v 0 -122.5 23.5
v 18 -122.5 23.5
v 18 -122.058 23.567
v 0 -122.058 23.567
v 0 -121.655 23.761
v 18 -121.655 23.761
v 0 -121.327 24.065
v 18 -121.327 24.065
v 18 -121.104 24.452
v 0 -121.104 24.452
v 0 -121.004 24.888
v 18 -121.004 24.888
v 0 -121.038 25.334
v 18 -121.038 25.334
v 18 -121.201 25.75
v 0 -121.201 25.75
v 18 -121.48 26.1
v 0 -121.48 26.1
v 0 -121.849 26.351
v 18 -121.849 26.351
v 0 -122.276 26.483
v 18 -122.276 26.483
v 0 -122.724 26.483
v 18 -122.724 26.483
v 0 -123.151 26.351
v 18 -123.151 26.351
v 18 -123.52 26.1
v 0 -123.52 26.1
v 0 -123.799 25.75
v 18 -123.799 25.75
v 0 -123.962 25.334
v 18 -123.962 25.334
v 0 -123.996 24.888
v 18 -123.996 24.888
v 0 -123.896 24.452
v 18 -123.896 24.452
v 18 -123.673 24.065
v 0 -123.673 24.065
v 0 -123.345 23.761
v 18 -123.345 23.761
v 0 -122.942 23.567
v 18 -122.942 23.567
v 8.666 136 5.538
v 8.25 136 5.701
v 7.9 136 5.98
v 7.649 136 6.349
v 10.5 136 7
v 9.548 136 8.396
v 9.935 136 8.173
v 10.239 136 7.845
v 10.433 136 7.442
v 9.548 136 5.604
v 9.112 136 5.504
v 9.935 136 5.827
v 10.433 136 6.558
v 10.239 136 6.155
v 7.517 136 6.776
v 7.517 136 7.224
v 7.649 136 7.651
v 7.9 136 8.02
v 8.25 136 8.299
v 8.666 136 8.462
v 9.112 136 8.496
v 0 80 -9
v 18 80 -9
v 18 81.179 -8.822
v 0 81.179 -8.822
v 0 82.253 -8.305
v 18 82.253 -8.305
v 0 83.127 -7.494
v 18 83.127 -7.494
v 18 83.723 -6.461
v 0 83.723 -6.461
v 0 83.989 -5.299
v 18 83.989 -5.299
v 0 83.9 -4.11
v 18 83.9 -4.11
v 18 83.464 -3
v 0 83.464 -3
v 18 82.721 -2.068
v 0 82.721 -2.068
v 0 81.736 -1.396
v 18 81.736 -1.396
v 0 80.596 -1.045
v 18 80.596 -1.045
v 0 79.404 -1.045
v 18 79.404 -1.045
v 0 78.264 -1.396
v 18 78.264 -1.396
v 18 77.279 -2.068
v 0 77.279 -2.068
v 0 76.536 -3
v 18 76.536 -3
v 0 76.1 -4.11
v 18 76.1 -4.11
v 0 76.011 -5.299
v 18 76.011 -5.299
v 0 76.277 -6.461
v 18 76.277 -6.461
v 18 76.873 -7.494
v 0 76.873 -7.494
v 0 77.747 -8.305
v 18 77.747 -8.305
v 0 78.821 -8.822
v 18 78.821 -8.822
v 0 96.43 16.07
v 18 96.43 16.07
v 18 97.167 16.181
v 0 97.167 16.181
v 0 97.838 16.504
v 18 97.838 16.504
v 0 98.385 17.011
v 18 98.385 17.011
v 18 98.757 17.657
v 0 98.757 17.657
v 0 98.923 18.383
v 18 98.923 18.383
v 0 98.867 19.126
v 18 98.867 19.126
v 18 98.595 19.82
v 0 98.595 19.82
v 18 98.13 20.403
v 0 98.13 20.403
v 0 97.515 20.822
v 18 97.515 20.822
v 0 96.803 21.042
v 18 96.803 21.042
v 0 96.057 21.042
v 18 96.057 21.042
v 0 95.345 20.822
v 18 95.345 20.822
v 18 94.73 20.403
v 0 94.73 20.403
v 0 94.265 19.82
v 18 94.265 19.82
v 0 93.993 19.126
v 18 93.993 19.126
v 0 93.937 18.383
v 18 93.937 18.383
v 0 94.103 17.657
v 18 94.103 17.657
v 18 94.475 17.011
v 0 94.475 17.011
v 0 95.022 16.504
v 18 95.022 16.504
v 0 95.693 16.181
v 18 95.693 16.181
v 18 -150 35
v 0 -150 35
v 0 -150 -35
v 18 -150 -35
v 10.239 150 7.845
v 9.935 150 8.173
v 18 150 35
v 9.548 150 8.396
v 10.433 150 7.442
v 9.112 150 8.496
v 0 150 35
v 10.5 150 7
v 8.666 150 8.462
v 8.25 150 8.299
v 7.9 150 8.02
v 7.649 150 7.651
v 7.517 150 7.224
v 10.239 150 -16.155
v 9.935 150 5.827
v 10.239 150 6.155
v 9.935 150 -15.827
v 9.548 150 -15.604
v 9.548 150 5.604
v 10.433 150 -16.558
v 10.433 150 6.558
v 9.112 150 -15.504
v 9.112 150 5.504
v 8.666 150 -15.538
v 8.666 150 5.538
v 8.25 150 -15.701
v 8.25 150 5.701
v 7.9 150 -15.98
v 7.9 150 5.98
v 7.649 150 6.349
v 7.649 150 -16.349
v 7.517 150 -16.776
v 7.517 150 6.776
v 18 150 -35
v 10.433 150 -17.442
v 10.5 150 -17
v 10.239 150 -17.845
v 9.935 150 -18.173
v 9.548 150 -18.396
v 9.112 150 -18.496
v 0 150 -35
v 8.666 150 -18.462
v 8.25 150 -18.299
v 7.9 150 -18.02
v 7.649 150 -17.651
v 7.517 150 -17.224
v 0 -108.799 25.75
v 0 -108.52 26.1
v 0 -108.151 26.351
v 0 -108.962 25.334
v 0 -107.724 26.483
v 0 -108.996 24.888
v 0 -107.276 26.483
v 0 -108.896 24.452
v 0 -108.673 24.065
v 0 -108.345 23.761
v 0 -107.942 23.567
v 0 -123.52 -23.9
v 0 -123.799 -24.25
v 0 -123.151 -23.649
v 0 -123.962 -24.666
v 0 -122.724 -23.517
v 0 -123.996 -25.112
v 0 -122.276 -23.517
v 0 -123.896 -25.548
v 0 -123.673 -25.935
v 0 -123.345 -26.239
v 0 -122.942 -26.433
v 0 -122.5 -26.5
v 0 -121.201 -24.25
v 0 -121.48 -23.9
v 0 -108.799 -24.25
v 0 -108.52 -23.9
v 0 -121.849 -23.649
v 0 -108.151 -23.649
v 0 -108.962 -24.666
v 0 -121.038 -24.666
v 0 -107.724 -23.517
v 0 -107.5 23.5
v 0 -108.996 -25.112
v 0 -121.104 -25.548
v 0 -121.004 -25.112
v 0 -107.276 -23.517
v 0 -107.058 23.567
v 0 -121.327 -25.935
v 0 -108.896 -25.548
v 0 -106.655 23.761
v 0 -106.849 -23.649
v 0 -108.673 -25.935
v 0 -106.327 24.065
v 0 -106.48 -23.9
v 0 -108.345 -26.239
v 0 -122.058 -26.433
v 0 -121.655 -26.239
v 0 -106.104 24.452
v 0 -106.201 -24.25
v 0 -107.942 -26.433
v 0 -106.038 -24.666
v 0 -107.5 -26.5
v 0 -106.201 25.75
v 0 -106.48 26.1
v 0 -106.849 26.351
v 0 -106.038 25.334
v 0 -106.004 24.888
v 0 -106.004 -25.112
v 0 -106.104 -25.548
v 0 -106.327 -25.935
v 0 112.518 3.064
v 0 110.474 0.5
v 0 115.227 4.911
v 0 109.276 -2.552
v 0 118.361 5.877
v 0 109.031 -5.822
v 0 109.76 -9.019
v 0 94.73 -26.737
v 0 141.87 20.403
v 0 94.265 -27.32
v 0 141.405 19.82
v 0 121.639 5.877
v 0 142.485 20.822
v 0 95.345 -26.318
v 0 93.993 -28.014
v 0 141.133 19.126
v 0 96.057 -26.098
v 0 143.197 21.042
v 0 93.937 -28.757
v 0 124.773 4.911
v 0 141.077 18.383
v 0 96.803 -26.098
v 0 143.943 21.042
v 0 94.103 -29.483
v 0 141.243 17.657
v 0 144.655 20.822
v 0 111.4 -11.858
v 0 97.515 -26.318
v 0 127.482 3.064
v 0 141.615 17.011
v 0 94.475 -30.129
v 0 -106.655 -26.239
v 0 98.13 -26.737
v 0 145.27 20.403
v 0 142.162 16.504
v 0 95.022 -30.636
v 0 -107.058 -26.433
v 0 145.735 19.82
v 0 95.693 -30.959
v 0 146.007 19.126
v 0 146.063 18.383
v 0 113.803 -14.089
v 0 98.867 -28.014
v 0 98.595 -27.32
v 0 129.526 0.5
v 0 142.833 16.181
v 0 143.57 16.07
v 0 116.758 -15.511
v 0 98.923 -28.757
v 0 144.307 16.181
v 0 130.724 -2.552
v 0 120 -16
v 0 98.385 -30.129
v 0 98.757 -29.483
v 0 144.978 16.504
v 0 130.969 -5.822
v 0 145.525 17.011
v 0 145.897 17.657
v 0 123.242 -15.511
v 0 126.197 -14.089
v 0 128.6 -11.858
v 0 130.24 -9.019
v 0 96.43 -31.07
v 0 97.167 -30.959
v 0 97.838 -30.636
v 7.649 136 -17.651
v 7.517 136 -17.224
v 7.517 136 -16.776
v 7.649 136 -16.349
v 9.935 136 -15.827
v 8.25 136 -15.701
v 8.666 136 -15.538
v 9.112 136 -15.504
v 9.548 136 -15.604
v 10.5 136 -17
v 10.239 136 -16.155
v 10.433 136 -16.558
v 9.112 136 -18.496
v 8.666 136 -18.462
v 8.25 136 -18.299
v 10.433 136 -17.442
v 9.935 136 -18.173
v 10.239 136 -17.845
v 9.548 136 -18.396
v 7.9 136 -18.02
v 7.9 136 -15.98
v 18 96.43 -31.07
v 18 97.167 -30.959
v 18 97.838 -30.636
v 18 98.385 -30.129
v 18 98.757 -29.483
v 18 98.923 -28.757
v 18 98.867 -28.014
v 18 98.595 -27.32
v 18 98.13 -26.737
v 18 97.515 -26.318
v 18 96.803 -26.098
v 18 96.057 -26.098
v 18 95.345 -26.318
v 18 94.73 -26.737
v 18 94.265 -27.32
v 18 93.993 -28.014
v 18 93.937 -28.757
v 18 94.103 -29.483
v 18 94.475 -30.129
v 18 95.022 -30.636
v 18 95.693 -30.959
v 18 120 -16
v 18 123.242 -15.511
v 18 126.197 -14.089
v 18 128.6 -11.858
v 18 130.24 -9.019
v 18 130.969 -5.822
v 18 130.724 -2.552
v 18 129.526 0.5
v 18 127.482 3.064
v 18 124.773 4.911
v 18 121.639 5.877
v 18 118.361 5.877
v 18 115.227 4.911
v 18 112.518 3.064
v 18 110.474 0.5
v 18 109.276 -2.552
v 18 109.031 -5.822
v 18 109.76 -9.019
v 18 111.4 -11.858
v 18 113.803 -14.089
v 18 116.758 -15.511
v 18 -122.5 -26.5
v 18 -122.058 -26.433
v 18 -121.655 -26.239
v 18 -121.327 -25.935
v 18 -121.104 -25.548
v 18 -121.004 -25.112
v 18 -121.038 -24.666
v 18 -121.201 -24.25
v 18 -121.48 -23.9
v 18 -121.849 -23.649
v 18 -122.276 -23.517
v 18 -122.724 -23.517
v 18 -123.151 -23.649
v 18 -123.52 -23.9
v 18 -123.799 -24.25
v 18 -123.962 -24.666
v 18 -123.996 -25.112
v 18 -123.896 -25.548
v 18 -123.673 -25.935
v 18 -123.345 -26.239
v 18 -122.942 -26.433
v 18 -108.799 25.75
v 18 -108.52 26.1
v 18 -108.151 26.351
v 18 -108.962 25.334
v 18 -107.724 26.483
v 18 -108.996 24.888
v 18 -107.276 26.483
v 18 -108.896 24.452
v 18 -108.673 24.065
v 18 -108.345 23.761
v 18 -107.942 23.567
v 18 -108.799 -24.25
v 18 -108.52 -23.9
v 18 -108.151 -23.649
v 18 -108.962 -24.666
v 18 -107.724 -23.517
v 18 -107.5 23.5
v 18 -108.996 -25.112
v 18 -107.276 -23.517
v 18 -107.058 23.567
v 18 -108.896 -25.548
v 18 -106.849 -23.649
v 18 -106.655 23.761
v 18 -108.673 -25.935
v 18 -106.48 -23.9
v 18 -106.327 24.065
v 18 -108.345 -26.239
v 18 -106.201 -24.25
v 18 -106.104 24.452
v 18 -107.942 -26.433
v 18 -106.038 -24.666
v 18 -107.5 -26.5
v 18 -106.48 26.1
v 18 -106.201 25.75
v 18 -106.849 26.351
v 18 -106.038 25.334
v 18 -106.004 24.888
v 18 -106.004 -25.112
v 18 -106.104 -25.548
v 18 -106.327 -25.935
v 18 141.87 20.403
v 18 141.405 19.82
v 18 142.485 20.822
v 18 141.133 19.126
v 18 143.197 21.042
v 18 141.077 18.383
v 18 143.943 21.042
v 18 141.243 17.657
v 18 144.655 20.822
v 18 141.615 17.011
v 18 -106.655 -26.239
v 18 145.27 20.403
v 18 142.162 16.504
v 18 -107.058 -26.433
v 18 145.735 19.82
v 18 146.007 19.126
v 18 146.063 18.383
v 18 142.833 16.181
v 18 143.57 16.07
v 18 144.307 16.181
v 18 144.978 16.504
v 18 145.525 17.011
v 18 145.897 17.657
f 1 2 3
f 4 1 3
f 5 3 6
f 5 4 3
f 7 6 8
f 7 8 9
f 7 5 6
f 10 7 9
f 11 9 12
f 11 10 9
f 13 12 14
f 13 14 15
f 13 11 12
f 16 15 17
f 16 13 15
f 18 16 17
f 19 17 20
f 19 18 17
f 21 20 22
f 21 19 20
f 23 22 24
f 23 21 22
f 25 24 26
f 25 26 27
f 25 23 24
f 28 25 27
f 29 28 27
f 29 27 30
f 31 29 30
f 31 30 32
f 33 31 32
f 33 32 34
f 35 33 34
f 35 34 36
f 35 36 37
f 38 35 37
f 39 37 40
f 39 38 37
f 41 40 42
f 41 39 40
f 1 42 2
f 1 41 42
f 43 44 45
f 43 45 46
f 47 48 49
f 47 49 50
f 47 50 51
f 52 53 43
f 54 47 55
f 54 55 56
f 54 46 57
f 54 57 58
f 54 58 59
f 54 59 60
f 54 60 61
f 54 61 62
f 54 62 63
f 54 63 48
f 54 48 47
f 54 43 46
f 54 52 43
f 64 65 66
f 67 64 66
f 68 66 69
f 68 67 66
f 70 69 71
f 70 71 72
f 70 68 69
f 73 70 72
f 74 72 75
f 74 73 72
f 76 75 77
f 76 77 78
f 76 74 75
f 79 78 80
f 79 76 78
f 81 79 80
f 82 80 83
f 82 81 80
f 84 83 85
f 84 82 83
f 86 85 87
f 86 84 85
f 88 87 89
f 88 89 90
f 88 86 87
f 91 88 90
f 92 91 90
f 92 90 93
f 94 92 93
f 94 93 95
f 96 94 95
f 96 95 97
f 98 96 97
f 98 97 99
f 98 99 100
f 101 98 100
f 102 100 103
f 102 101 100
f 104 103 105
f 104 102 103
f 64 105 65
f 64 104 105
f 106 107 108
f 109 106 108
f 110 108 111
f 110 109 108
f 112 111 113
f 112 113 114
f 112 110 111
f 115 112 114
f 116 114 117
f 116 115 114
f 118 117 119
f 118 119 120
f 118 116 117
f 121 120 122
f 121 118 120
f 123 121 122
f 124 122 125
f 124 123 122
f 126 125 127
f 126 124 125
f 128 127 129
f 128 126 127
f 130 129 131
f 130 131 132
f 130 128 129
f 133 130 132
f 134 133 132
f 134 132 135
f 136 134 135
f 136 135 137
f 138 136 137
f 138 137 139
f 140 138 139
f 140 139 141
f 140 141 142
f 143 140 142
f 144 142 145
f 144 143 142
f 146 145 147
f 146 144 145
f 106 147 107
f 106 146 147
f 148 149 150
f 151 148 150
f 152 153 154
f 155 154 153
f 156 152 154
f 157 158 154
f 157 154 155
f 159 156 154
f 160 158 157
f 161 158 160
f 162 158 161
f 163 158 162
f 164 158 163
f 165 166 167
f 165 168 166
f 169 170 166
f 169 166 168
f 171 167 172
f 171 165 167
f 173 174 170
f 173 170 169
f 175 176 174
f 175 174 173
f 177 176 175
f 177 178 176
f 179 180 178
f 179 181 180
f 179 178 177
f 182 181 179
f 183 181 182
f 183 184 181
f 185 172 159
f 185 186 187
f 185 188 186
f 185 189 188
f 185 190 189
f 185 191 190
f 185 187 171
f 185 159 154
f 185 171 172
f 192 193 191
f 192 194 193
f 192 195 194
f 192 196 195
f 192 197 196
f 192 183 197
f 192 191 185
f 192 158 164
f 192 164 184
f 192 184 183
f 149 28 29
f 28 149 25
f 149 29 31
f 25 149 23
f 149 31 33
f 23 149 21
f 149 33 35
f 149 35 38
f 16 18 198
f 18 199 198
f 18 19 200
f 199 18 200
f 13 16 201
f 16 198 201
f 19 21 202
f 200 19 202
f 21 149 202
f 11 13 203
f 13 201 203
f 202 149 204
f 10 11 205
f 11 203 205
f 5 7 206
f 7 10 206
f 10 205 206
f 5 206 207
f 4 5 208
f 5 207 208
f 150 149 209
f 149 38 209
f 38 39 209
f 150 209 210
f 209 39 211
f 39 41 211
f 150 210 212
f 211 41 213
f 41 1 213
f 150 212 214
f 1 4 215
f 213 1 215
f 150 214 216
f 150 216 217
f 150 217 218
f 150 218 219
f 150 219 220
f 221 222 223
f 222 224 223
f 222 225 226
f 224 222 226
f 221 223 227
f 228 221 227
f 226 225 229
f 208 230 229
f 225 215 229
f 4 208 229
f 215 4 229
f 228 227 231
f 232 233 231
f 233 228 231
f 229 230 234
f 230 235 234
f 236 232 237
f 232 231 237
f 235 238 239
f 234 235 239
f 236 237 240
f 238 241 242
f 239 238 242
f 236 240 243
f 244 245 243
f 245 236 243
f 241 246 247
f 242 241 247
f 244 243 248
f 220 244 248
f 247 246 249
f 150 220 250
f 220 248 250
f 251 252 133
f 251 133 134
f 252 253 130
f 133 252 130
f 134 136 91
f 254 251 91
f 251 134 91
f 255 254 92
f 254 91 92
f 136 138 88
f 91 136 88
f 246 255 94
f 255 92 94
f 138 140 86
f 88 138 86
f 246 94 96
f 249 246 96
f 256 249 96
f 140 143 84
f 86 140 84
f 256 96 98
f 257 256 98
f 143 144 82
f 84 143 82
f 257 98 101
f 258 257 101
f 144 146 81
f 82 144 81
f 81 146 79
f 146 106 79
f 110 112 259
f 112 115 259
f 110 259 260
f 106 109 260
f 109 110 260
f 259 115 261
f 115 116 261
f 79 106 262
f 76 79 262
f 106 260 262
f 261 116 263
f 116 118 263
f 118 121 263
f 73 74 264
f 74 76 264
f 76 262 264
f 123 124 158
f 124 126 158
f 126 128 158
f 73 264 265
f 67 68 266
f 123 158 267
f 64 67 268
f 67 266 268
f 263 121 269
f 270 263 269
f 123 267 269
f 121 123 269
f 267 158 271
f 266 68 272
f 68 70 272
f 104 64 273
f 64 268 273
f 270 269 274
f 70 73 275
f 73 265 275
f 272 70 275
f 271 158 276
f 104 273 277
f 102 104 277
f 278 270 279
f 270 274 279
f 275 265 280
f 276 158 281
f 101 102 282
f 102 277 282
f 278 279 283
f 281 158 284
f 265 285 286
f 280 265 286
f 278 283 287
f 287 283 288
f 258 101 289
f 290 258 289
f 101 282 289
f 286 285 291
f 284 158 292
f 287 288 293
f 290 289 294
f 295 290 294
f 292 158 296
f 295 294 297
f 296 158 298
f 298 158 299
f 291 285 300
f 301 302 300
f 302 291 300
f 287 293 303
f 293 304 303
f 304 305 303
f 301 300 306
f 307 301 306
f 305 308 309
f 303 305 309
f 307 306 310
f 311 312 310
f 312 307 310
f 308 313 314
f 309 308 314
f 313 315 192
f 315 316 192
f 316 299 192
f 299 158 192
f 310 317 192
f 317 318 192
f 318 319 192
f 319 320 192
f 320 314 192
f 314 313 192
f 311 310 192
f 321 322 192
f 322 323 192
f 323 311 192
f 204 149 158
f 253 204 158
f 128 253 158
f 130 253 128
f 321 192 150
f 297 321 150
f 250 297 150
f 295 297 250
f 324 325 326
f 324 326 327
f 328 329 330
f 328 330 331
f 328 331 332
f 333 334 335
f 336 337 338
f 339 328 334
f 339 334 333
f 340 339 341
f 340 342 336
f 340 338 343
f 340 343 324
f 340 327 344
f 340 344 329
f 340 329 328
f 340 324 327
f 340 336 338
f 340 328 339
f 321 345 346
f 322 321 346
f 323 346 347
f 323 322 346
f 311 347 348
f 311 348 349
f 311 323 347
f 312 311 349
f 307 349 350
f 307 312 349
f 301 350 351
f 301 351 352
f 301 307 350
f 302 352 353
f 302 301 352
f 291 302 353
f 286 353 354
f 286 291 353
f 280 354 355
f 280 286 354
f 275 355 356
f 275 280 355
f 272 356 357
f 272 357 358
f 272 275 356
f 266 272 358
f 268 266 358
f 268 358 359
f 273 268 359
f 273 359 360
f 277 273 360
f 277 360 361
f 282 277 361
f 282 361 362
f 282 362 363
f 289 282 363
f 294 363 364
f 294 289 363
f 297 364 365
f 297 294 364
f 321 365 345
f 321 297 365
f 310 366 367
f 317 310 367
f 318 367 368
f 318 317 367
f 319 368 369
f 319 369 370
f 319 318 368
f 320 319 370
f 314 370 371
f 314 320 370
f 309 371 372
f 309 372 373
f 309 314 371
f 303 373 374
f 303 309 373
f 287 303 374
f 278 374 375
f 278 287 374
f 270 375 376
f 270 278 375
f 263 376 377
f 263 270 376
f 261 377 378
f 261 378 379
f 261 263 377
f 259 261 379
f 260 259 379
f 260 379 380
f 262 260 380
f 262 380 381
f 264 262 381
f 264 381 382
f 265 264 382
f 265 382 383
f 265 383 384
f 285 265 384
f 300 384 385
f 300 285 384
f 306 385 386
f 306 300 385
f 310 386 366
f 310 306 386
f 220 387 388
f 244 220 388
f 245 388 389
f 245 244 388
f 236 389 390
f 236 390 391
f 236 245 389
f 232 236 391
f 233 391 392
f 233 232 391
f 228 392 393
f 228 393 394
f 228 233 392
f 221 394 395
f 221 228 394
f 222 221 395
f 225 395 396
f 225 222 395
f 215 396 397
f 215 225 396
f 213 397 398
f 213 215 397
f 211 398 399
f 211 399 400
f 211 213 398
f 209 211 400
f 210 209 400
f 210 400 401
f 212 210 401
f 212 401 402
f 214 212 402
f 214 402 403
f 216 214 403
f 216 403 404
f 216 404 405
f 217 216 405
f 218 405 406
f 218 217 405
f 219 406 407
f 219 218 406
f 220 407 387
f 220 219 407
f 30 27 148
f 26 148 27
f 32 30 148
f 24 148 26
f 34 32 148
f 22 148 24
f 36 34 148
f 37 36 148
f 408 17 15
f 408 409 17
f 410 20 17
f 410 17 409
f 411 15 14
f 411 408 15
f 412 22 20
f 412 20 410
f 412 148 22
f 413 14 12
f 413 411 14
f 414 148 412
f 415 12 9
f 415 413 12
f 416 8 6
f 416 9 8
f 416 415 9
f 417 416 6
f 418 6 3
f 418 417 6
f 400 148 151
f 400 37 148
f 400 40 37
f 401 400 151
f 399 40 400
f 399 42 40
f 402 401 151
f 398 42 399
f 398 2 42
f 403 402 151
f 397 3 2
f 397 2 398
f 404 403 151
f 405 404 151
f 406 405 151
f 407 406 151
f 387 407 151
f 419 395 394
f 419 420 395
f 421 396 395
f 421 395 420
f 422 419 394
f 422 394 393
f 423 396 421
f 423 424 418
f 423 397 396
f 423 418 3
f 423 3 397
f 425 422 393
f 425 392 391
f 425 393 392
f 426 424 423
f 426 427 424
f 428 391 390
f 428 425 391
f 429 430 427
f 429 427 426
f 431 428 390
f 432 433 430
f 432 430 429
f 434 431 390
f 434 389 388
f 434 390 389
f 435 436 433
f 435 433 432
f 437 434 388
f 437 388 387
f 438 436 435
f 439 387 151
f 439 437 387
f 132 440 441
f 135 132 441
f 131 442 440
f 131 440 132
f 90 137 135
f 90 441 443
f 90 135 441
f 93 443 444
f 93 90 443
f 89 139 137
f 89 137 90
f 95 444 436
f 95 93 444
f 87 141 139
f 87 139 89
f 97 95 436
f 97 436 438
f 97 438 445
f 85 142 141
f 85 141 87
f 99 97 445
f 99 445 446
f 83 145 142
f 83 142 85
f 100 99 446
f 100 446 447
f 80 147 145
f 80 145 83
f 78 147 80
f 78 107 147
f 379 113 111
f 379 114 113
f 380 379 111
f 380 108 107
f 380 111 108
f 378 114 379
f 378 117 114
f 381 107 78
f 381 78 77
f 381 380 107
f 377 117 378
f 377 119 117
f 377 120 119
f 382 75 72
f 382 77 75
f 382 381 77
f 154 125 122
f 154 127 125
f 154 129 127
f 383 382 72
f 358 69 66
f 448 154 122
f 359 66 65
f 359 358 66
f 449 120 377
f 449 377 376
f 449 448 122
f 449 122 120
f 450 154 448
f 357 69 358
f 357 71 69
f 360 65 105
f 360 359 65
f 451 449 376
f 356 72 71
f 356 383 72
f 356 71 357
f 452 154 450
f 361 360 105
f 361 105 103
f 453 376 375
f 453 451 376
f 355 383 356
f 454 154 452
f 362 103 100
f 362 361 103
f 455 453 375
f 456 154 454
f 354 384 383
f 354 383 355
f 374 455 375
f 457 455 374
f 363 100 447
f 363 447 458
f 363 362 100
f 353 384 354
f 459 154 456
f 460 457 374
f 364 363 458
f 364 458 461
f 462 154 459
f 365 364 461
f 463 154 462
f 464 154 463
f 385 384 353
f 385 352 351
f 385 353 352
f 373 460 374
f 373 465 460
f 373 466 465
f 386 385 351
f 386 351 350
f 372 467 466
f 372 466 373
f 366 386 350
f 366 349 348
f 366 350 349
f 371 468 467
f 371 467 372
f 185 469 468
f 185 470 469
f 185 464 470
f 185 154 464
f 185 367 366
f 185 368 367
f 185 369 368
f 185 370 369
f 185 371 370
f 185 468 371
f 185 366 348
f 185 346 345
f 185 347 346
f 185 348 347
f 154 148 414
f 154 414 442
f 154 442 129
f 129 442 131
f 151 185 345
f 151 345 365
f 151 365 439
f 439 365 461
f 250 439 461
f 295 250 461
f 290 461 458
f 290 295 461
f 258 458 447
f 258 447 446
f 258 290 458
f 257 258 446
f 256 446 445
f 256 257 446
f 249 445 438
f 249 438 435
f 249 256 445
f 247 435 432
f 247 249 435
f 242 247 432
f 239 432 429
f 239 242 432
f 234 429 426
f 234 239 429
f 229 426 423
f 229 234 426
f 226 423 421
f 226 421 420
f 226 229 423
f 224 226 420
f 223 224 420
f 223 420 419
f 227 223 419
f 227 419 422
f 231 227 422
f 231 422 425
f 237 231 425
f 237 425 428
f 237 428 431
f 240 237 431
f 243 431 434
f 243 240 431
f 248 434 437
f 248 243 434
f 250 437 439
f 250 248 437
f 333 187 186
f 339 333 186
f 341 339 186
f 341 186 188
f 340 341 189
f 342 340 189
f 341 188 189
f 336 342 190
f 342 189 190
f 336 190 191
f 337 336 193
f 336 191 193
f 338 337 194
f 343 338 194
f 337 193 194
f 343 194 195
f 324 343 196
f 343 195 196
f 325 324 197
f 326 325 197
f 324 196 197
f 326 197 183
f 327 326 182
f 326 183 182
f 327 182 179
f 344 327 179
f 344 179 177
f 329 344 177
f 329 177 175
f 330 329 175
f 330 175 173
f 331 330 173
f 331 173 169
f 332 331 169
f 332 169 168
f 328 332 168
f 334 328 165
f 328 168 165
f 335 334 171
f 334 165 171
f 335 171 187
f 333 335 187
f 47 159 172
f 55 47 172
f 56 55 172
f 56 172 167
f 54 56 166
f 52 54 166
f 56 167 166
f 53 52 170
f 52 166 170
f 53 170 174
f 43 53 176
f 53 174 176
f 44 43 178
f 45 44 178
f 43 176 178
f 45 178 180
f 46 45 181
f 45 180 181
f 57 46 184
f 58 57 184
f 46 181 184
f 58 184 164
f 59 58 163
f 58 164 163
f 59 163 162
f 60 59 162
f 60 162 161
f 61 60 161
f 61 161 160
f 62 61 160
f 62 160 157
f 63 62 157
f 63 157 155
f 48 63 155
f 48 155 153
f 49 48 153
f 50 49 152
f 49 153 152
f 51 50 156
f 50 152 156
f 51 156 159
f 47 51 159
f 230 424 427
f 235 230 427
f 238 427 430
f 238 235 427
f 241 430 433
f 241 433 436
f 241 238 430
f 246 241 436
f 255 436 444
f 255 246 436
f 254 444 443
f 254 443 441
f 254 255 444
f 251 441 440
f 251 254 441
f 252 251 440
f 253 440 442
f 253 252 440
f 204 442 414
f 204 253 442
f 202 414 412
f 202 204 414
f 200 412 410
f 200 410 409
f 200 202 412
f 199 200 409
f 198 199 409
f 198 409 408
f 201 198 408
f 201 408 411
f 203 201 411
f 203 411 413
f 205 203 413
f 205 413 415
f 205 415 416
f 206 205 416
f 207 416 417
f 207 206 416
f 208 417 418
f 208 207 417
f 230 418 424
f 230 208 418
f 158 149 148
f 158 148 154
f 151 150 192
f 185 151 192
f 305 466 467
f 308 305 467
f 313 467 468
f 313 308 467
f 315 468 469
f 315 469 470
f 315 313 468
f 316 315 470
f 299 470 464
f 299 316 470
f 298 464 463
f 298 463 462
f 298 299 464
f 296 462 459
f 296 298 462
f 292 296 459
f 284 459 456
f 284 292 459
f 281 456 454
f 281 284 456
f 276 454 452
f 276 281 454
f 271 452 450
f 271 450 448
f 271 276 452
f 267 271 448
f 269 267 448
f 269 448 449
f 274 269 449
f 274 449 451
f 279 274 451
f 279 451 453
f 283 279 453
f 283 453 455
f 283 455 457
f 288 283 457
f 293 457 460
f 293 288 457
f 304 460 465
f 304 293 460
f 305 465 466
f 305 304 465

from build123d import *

# Parameters (mm, degrees)
CROQUIS2_W              = 70
CROQUIS2_H              = 300
CROQUIS2_R              = 1.5
CROQUIS2_R_2            = 4
CROQUIS2_R_3            = 2.5
CROQUIS2_R_4            = 11
SALIENTE_EXTRUIR1_DEPTH = 18
CROQUIS3_R              = 1.5
CORTAR_EXTRUIR1_DEPTH   = 14


with BuildPart() as part:
    # Croquis2 → Saliente-Extruir1 (new body)
    with BuildSketch(Plane(origin=(0, 0, 0), x_dir=(0, 0, -1), z_dir=(1, 0, 0))):
        Rectangle(CROQUIS2_W, CROQUIS2_H)
        with Locations((25, -122.5)):
            Circle(CROQUIS2_R, mode=Mode.SUBTRACT)
        with Locations((-25, -122.5)):
            Circle(CROQUIS2_R, mode=Mode.SUBTRACT)
        with Locations((25, -107.5)):
            Circle(CROQUIS2_R, mode=Mode.SUBTRACT)
        with Locations((-25, -107.5)):
            Circle(CROQUIS2_R, mode=Mode.SUBTRACT)
        with Locations((5, 80)):
            Circle(CROQUIS2_R_2, mode=Mode.SUBTRACT)
        with Locations((28.57, 96.43)):
            Circle(CROQUIS2_R_3, mode=Mode.SUBTRACT)
        with Locations((5, 120)):
            Circle(CROQUIS2_R_4, mode=Mode.SUBTRACT)
        with Locations((-18.57, 96.43)):
            Circle(CROQUIS2_R_3, mode=Mode.SUBTRACT)
        with Locations((-18.57, 143.57)):
            Circle(CROQUIS2_R_3, mode=Mode.SUBTRACT)
    extrude(amount=SALIENTE_EXTRUIR1_DEPTH)

    # Croquis3 → Cortar-Extruir1 (cut)
    with BuildSketch(Plane(origin=(0, 150, 0), x_dir=(1, 0, 0), z_dir=(0, 1, 0))):
        with Locations((9, -7)):
            Circle(CROQUIS3_R)
        with Locations((9, 17)):
            Circle(CROQUIS3_R)
    extrude(amount=-CORTAR_EXTRUIR1_DEPTH, mode=Mode.SUBTRACT)


solid = part.part
